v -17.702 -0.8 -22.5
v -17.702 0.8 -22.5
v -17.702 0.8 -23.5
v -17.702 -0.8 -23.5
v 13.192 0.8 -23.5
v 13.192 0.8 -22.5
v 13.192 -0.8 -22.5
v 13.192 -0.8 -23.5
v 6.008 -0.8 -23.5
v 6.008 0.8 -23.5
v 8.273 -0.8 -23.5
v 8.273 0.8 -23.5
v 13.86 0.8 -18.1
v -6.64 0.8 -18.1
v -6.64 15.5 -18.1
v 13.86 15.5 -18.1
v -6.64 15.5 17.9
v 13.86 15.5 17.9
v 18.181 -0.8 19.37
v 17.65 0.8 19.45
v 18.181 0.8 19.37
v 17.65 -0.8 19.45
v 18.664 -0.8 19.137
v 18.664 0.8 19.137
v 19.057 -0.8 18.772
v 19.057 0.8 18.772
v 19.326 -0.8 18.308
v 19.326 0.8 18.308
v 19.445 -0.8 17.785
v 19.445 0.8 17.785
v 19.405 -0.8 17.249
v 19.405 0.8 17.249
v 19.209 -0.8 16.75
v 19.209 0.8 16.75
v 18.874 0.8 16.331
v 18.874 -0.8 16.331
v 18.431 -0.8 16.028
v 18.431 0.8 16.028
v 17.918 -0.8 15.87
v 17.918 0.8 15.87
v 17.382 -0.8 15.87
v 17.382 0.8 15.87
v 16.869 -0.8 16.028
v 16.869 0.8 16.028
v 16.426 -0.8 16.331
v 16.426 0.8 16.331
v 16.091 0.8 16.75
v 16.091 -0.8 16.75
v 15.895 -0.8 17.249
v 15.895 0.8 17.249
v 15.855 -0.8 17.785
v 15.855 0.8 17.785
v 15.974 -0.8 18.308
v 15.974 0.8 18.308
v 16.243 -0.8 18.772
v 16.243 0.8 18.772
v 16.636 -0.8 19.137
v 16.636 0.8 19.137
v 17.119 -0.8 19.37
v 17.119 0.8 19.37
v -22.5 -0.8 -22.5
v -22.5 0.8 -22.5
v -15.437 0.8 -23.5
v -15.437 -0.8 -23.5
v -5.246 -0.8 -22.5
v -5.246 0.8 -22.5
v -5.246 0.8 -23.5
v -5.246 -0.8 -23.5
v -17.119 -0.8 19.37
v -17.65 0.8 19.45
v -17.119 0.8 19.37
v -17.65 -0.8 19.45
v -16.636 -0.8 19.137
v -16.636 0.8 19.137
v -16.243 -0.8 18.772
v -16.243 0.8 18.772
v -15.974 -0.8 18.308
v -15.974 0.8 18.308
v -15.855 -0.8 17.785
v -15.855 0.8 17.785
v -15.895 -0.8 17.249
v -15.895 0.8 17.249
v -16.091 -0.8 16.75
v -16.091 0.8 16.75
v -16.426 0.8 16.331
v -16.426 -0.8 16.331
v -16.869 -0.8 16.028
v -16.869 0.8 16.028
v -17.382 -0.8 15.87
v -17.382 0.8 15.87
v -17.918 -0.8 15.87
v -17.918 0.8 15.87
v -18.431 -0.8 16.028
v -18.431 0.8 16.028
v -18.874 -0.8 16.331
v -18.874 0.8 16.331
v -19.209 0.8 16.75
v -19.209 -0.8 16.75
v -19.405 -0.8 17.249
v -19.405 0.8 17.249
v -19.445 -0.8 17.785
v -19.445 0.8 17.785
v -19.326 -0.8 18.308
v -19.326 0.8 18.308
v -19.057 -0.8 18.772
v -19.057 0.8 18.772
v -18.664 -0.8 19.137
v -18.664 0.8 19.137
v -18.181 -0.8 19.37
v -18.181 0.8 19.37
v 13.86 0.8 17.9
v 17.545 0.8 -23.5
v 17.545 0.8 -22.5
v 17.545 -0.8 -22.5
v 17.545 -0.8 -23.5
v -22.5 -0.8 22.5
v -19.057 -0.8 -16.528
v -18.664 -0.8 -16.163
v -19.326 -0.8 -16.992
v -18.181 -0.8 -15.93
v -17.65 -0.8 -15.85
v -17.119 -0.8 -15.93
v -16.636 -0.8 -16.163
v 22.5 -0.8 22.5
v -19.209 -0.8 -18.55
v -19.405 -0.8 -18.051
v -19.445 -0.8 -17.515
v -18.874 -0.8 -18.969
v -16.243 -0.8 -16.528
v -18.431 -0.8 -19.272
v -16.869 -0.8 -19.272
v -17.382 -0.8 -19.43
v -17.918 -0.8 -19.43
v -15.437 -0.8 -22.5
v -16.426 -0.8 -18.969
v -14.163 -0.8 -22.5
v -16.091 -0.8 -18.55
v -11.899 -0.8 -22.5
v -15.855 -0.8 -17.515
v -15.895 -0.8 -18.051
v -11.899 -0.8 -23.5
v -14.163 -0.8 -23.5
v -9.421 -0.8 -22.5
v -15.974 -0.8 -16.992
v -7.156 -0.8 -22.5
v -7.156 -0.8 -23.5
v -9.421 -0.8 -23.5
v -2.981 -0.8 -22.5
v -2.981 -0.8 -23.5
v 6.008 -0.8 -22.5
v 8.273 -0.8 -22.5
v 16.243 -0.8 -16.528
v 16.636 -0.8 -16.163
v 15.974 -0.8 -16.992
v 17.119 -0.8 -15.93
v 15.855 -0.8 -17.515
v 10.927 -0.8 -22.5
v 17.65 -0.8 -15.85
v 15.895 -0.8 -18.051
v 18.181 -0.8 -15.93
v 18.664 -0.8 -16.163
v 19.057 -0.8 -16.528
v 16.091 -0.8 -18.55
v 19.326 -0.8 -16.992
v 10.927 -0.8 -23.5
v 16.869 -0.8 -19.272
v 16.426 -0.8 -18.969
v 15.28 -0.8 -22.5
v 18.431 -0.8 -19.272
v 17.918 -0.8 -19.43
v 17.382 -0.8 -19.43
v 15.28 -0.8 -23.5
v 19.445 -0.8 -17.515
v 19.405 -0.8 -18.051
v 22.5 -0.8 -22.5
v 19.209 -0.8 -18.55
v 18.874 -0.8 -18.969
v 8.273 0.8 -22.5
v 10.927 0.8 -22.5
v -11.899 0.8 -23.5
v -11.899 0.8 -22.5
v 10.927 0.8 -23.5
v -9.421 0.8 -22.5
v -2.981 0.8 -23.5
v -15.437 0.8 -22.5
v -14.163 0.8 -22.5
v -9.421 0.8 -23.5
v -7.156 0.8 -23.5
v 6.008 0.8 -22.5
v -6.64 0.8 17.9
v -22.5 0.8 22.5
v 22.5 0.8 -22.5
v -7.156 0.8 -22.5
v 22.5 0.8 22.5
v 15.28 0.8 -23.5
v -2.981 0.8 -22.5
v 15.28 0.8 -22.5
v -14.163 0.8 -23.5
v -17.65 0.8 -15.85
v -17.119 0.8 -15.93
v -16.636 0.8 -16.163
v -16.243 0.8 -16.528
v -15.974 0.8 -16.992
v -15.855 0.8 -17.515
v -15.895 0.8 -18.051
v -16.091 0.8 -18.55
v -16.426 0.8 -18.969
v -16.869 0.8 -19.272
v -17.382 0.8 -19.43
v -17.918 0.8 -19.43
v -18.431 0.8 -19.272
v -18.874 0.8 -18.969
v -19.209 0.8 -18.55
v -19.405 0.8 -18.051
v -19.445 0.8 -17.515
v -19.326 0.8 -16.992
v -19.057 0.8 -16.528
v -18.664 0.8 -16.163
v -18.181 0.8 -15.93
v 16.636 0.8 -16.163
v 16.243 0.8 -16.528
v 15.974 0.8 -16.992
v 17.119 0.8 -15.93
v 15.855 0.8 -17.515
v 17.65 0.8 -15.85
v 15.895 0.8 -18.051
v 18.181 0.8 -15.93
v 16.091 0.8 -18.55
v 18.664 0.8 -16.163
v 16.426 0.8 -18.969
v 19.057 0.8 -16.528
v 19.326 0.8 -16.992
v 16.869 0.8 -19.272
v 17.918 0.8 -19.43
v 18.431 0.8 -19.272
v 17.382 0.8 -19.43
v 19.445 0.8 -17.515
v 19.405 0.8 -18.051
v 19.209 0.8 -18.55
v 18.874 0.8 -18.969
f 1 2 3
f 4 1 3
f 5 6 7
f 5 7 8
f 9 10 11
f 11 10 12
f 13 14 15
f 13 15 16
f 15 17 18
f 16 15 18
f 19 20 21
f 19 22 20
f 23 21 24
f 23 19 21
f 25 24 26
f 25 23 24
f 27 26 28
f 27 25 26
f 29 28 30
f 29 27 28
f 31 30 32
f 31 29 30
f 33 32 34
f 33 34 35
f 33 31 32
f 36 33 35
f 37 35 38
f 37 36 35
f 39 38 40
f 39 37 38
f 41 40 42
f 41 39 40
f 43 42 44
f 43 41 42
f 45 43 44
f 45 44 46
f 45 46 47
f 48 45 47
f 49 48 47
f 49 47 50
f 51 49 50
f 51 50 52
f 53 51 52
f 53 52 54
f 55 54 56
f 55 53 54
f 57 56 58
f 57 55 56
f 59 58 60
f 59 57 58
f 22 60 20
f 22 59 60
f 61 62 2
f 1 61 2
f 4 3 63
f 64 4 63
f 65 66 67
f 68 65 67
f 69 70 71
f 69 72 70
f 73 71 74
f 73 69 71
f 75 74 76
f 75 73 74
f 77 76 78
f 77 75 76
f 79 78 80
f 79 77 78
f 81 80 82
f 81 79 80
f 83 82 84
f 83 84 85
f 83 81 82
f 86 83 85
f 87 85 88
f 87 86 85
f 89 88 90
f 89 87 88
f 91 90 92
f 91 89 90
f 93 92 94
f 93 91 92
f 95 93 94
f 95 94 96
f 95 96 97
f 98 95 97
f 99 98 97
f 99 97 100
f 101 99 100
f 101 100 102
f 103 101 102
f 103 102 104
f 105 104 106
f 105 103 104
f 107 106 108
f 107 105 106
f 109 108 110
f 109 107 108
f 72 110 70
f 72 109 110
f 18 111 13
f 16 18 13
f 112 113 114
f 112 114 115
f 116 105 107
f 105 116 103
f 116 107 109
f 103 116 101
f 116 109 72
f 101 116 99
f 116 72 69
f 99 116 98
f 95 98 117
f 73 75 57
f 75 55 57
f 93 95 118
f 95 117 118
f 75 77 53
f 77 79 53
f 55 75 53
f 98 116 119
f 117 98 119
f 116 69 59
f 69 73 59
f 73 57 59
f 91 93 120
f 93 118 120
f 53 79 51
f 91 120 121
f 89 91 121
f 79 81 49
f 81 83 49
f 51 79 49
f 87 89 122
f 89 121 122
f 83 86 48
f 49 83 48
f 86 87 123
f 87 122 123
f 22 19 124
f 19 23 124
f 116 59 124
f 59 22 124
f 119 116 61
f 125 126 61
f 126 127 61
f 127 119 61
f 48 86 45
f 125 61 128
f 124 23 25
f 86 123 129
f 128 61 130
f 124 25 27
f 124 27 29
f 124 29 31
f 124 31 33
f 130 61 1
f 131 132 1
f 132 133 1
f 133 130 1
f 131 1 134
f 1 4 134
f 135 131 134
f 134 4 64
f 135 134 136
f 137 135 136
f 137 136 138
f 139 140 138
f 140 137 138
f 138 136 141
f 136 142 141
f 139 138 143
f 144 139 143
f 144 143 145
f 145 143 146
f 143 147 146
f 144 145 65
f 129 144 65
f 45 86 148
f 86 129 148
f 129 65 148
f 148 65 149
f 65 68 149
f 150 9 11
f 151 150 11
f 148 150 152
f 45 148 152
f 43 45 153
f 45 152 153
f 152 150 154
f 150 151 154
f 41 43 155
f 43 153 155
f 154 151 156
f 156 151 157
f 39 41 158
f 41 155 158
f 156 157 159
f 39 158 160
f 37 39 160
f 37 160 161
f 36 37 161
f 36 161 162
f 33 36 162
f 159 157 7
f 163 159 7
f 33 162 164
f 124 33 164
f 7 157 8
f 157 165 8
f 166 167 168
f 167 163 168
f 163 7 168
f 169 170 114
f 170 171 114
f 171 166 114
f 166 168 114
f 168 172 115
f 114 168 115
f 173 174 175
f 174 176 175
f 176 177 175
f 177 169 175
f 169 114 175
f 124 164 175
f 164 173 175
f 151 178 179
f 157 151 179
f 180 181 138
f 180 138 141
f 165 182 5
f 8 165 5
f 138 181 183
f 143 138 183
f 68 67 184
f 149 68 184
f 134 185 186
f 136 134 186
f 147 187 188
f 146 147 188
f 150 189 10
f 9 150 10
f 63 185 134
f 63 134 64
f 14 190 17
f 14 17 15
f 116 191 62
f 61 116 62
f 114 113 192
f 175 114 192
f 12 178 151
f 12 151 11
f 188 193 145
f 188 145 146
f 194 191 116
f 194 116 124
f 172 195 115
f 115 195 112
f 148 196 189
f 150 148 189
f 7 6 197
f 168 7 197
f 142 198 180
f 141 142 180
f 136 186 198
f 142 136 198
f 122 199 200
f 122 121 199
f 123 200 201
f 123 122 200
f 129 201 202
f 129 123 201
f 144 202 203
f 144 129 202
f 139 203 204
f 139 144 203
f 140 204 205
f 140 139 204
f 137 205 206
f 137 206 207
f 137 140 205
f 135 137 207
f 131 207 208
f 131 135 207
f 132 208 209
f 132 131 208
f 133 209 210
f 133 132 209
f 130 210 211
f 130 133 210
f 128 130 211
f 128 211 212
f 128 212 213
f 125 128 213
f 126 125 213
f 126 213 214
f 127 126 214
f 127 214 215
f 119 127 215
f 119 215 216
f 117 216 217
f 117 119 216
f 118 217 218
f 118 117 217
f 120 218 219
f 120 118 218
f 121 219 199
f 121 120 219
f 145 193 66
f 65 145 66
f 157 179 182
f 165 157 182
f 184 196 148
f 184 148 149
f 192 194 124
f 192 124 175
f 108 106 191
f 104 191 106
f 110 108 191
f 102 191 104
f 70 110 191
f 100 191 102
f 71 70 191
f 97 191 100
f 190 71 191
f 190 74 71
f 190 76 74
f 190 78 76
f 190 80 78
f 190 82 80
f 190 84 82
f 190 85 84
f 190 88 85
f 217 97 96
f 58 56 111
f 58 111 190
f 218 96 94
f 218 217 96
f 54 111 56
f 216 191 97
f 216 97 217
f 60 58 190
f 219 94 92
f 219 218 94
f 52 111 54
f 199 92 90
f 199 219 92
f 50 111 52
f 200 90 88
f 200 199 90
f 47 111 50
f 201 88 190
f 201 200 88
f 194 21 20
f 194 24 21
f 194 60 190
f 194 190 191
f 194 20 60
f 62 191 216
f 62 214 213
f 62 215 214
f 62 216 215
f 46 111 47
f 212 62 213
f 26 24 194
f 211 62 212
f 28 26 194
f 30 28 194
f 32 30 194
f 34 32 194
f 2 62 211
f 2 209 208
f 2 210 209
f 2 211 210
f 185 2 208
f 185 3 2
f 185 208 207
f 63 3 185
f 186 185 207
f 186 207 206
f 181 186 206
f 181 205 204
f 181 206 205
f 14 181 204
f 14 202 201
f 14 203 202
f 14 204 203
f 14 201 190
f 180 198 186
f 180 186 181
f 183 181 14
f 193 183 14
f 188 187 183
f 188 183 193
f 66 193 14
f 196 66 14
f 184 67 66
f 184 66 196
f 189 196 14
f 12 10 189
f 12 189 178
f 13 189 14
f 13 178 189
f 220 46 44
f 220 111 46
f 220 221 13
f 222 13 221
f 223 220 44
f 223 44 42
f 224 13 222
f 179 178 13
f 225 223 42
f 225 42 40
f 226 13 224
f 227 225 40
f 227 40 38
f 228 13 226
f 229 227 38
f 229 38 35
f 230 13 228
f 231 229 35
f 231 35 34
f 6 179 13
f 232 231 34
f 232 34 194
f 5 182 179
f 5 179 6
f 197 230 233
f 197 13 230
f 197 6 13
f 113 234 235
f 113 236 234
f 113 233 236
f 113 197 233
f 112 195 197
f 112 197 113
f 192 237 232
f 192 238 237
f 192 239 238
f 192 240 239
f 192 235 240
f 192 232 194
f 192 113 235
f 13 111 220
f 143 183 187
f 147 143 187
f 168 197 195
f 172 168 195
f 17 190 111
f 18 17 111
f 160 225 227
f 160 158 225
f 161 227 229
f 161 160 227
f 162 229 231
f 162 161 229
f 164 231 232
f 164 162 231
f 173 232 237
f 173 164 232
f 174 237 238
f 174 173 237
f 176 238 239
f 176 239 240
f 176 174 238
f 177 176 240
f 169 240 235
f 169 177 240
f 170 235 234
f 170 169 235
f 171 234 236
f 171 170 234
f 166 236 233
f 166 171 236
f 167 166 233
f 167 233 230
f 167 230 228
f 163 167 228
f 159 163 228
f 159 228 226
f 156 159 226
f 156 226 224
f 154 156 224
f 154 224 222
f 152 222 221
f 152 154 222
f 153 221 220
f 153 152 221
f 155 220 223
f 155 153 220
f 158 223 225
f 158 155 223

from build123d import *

# Parameters (mm, degrees)
SKETCH1_W           = 45
SKETCH1_H           = 45
SKETCH1_R           = 1.8
BOSS_EXTRUDE1_DEPTH = 0.8
SKETCH2_W           = 2.26484959
SKETCH2_H           = 1
SKETCH2_W_2         = 2.264849589
BOSS_EXTRUDE2_DEPTH = 1.6
SKETCH3_W           = 20.5
SKETCH3_H           = 36
SPARK_CORE_DEPTH    = 14.7


with BuildPart() as part:
    # Sketch1 → Boss-Extrude1 (new, symmetric)
    with BuildSketch(Plane(origin=(0, 0, 0), x_dir=(1, 0, 0), z_dir=(0, 1, 0))):
        Rectangle(SKETCH1_W, SKETCH1_H)
        with Locations(Location((-17.65, 17.65, 0), (0, 0, 270))):
            Circle(SKETCH1_R, mode=Mode.SUBTRACT)
        with Locations(Location((17.65, 17.65, 0), (0, 0, 270))):
            Circle(SKETCH1_R, mode=Mode.SUBTRACT)
        with Locations(Location((17.65, -17.65, 0), (0, 0, 270))):
            Circle(SKETCH1_R, mode=Mode.SUBTRACT)
        with Locations(Location((-17.65, -17.65, 0), (0, 0, 270))):
            Circle(SKETCH1_R, mode=Mode.SUBTRACT)
    extrude(amount=BOSS_EXTRUDE1_DEPTH, both=True)

    # Sketch2 → Boss-Extrude2 (add)
    with BuildSketch(Plane(origin=(0, 0.8, 0), x_dir=(1, 0, 0), z_dir=(0, 1, 0))):
        with Locations((-16.569776824, 23)):
            Rectangle(SKETCH2_W, SKETCH2_H)
        with Locations((-13.030949341, 23)):
            Rectangle(SKETCH2_W_2, SKETCH2_H)
        with Locations((-8.288920513, 23)):
            Rectangle(SKETCH2_W, SKETCH2_H)
        with Locations((-4.113104082, 23)):
            Rectangle(SKETCH2_W_2, SKETCH2_H)
        with Locations((7.140367316, 23)):
            Rectangle(SKETCH2_W_2, SKETCH2_H)
        with Locations((12.059337518, 23)):
            Rectangle(SKETCH2_W_2, SKETCH2_H)
        with Locations((16.412095322, 23)):
            Rectangle(SKETCH2_W, SKETCH2_H)
    extrude(amount=-BOSS_EXTRUDE2_DEPTH)

    # Sketch3 → Spark Core (add)
    with BuildSketch(Plane(origin=(0, 0.8, 0), x_dir=(1, 0, 0), z_dir=(0, 1, 0))):
        with Locations((3.61, 0.1)):
            Rectangle(SKETCH3_W, SKETCH3_H)
    extrude(amount=SPARK_CORE_DEPTH)


solid = part.part
